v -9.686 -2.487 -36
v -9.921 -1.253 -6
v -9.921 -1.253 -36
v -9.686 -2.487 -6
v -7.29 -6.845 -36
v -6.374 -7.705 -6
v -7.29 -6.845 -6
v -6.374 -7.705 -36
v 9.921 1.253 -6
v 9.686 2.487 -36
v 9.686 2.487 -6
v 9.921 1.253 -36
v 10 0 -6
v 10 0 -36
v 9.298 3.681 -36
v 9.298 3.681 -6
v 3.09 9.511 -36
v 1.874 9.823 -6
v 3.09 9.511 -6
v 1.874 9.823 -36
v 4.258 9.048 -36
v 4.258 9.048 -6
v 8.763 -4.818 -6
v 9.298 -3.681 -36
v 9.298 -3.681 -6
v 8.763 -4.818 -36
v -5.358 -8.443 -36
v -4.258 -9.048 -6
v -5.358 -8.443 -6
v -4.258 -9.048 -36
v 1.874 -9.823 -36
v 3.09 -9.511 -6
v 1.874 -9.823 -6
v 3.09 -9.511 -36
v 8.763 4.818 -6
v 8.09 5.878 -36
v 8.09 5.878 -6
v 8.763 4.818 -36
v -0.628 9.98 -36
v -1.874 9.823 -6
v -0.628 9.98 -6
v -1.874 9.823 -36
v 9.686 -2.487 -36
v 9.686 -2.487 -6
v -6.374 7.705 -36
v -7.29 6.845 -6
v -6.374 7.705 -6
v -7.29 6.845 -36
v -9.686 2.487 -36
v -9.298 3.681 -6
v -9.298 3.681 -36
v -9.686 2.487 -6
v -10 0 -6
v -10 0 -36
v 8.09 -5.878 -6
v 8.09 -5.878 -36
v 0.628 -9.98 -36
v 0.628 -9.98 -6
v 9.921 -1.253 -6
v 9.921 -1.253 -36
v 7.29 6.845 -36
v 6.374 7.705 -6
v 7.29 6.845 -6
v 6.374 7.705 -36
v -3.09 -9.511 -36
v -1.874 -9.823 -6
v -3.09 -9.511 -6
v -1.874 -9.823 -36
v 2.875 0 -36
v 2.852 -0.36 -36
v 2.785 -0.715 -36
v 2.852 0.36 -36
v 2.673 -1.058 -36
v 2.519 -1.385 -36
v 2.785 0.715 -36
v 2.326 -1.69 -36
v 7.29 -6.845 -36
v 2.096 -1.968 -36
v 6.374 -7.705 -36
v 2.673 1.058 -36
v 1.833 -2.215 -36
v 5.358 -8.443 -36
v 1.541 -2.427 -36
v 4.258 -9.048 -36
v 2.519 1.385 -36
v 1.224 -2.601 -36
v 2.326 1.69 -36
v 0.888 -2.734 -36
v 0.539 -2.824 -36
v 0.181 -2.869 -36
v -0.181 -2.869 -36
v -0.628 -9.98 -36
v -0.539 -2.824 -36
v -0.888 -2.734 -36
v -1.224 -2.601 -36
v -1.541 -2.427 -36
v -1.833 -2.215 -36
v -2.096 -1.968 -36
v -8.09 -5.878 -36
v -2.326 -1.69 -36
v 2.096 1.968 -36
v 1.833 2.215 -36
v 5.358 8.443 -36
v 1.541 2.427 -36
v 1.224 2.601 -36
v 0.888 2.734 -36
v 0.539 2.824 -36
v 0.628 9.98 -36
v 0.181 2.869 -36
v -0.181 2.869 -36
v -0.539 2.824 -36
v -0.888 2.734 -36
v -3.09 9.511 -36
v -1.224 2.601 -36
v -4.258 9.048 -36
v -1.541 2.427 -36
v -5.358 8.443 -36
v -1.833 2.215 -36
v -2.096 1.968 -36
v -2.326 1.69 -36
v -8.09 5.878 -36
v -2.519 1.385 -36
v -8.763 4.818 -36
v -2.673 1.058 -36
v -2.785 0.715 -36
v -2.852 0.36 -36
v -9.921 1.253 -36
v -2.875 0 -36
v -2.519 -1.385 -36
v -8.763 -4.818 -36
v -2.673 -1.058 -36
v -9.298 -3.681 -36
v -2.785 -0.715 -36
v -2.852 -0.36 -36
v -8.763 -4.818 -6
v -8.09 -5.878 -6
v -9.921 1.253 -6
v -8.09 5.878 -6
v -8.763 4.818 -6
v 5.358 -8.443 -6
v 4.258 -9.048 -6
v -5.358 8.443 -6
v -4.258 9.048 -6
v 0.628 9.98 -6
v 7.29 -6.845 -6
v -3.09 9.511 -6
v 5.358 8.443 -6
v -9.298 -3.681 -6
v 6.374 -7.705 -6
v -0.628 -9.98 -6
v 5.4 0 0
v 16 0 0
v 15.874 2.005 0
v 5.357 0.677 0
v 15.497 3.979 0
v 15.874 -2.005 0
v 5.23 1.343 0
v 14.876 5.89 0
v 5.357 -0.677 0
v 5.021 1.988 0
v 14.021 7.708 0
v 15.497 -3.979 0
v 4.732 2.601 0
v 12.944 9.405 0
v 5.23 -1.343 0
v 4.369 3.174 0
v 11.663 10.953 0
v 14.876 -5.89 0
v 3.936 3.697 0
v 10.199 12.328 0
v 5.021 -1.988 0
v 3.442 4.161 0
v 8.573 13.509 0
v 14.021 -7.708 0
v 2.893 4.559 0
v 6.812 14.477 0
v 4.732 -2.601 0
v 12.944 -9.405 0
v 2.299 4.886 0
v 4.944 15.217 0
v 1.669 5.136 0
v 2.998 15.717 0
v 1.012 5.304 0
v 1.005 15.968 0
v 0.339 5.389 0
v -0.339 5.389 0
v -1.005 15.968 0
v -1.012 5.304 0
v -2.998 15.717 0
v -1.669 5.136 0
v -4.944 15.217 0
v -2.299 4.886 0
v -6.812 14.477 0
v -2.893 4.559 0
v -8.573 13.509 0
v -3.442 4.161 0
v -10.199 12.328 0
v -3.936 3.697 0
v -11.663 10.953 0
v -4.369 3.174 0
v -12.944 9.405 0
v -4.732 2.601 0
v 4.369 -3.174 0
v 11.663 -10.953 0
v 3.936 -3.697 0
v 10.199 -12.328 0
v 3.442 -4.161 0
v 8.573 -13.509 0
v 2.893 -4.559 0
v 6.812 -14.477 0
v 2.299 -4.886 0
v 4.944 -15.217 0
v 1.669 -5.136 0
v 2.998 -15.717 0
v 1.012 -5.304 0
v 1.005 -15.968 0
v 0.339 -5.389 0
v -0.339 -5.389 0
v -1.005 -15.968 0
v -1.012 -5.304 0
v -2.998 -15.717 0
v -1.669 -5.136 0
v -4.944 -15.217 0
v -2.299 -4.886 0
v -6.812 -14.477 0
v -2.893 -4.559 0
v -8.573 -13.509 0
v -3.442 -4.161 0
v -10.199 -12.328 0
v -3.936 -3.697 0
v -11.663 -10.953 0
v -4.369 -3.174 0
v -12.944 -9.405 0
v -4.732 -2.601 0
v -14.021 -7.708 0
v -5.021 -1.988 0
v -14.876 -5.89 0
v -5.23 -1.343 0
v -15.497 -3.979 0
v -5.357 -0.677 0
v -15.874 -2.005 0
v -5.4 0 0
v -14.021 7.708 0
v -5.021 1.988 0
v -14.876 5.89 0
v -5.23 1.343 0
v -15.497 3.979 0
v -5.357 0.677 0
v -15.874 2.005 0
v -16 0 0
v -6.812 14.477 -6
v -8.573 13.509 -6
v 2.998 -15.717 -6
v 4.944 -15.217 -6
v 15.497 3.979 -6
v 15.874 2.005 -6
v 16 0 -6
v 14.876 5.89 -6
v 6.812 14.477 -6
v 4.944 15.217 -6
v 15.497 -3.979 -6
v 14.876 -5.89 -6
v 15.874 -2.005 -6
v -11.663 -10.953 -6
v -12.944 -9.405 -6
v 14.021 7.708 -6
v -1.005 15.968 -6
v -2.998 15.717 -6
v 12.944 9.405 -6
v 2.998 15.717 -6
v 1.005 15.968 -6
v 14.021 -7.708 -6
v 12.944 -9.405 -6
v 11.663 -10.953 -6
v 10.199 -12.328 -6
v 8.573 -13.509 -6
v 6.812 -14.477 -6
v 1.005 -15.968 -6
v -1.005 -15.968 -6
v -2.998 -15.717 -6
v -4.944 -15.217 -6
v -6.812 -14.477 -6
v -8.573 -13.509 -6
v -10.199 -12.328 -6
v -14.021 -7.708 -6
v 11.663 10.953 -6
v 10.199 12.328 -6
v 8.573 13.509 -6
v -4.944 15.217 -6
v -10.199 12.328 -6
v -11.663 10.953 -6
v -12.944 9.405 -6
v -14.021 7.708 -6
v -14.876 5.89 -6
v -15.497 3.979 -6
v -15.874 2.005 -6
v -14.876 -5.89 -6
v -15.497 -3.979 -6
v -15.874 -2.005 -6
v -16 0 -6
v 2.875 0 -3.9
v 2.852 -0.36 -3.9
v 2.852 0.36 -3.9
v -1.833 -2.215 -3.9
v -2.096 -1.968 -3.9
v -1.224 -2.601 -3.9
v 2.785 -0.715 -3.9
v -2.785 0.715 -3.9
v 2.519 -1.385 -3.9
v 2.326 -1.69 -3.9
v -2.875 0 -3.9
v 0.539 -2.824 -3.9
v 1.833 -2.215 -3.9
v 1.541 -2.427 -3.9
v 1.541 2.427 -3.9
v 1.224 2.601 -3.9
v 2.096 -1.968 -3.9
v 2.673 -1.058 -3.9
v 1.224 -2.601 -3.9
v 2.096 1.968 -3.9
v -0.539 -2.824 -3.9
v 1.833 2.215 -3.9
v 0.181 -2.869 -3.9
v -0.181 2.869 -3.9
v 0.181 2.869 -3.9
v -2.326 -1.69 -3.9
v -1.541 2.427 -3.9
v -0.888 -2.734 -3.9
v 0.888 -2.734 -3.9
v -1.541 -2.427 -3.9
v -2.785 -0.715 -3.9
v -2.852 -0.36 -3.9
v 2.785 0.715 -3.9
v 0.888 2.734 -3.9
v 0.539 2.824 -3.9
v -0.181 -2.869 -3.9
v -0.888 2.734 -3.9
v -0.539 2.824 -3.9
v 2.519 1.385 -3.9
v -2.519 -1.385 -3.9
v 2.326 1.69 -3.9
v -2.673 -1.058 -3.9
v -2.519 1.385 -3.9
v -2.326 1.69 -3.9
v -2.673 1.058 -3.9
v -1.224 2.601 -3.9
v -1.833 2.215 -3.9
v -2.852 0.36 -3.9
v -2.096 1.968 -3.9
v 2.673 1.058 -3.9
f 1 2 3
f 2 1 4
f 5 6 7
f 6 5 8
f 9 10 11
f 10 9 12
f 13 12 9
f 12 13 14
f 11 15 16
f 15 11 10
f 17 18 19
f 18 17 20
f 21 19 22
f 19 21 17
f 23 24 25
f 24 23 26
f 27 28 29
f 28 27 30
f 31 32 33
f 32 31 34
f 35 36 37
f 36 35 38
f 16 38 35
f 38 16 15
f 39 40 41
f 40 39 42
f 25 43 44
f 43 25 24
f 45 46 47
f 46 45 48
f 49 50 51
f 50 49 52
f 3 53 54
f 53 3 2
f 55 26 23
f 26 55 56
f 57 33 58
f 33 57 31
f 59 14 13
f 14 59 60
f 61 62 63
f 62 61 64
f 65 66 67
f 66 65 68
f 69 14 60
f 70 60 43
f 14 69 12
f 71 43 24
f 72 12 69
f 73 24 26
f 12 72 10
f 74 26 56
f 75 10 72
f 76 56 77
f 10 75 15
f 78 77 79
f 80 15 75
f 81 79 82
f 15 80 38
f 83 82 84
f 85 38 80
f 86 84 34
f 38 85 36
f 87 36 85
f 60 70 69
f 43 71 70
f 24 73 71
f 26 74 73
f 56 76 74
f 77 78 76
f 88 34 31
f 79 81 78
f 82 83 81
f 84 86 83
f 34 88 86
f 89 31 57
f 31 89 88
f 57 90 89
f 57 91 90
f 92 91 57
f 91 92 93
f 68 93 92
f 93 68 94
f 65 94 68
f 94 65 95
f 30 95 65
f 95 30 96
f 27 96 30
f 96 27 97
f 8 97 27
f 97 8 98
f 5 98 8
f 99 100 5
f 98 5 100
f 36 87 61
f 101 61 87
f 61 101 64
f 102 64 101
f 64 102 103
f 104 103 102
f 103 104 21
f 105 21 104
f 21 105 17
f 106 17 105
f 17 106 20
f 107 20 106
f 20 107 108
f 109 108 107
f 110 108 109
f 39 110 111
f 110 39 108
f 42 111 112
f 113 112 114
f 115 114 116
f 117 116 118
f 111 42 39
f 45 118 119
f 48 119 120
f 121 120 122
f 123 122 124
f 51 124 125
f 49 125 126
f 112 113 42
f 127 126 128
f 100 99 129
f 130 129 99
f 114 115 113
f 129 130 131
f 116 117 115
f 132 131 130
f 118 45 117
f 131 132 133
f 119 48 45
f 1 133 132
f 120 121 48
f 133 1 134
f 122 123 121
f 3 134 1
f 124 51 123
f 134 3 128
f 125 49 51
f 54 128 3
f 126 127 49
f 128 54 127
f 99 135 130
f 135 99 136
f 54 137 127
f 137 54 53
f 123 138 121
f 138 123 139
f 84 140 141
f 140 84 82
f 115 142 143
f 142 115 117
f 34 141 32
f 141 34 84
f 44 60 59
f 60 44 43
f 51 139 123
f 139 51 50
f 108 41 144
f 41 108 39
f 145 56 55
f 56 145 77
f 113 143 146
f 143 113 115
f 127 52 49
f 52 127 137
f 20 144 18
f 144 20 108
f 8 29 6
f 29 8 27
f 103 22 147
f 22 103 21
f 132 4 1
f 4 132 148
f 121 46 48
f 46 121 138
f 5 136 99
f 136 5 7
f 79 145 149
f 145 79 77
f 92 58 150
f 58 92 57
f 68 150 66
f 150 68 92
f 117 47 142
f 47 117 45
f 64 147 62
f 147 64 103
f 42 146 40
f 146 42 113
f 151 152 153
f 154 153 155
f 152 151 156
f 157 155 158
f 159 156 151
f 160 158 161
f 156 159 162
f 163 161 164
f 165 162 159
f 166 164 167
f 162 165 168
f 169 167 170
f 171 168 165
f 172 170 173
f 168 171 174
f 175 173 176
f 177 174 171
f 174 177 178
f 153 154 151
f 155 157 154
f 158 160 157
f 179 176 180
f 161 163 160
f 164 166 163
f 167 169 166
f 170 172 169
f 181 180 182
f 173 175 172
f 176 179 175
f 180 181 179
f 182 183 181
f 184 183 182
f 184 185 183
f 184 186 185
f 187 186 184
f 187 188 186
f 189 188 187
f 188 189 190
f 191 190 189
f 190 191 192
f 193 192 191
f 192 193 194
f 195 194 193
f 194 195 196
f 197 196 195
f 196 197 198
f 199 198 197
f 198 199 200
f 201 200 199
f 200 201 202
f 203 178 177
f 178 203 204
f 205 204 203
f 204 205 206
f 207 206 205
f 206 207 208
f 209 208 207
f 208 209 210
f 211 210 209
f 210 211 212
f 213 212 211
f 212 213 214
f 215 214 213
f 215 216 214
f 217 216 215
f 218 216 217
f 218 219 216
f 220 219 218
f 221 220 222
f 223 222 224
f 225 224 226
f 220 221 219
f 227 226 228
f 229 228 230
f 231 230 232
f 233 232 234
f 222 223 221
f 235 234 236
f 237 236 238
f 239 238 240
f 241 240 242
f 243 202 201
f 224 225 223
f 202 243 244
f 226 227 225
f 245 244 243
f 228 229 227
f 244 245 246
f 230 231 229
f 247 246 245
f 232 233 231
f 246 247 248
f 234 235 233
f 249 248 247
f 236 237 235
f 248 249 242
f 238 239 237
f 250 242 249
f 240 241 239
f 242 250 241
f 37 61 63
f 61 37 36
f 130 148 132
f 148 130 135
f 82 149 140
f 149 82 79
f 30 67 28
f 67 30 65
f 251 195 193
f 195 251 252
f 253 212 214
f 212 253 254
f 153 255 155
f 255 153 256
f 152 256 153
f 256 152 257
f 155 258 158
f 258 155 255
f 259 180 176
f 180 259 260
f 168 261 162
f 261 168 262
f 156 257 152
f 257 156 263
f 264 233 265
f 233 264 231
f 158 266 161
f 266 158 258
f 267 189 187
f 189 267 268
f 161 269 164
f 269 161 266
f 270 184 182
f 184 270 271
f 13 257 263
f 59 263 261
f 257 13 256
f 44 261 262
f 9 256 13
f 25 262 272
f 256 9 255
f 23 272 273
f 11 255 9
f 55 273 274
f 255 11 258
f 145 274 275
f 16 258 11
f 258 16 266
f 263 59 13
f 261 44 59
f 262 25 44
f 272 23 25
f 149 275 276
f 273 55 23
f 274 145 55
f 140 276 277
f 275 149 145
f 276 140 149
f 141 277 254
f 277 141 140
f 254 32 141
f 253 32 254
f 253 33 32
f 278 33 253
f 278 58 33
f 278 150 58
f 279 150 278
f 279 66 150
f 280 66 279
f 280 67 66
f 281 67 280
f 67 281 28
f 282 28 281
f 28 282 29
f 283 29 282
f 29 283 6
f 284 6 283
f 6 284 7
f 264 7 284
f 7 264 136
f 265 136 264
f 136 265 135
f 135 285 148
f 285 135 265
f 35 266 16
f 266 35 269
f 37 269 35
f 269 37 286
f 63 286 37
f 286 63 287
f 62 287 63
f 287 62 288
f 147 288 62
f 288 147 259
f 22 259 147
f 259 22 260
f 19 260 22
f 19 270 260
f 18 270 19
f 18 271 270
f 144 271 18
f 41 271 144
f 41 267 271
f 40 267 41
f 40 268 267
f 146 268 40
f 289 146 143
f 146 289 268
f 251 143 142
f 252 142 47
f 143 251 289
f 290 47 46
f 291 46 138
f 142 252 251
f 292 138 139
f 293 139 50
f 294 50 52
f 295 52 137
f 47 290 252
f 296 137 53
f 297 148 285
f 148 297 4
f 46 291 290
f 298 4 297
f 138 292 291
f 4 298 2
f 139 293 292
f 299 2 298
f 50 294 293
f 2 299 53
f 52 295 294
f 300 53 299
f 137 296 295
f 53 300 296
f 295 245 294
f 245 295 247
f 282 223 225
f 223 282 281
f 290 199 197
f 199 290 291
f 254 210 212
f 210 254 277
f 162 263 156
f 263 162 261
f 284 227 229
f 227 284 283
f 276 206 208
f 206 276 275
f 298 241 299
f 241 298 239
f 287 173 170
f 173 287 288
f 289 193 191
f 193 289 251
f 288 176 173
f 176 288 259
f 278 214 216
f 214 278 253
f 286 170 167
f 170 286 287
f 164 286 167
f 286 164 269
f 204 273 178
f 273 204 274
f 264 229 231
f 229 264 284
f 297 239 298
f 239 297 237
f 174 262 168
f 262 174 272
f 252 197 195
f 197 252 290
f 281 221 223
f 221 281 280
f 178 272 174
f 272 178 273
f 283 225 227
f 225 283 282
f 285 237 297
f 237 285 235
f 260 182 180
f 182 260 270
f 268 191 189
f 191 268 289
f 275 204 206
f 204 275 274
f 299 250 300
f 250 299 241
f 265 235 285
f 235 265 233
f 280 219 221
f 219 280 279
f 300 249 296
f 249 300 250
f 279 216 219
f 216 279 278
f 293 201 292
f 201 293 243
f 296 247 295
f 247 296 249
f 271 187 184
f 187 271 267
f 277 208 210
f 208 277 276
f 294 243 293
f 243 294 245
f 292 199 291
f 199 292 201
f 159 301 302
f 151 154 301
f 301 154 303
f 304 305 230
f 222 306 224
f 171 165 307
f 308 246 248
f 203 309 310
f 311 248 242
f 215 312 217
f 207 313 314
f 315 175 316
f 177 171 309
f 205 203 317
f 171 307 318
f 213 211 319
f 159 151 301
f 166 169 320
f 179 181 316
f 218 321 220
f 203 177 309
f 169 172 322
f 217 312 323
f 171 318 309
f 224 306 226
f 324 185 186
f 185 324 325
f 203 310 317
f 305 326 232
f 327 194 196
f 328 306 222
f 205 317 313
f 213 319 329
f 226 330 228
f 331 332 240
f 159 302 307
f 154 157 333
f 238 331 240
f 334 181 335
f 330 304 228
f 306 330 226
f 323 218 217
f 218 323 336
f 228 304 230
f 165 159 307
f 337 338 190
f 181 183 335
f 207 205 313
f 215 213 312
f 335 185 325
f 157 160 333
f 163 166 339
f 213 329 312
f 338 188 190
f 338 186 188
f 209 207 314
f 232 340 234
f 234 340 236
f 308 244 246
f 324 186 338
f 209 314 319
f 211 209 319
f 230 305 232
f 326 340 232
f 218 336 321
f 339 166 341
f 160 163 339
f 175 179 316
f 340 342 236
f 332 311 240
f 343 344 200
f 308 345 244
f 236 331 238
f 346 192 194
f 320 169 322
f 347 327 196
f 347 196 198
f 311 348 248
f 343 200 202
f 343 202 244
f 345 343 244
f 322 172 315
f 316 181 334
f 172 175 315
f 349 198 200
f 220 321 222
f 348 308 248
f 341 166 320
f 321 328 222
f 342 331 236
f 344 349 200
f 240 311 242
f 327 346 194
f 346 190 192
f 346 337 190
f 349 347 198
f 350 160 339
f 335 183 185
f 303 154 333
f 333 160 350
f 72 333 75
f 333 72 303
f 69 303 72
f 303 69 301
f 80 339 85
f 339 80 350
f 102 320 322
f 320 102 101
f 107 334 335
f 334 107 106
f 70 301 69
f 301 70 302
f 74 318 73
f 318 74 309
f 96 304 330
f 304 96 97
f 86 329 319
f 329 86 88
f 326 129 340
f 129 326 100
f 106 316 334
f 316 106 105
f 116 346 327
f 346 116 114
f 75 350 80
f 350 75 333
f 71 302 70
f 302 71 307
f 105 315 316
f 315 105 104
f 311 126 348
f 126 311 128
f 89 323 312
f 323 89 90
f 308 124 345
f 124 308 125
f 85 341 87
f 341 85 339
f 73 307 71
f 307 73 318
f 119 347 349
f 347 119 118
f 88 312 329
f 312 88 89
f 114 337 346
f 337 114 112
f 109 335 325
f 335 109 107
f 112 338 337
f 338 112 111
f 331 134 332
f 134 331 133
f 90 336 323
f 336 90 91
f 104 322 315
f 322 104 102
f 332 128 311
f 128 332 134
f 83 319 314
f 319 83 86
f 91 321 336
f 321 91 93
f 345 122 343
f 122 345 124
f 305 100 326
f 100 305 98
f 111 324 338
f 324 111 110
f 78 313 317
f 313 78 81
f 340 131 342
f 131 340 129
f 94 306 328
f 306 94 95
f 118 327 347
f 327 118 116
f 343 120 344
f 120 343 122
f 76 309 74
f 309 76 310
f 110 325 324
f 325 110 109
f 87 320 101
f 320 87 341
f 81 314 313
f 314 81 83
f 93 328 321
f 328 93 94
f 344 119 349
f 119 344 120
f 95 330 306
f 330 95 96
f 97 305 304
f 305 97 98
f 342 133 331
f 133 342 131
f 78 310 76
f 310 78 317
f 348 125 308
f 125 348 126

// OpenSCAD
$fn = 50;


difference() {
	union() {
		translate(v = [0, 0, -36.0000000000]) {
			cylinder(h = 36, r = 10.0000000000);
		}
		translate(v = [0, 0, -6.0000000000]) {
			cylinder(h = 6, r = 16.0000000000);
		}
	}
	union() {
		translate(v = [0, 0, 0]) {
			rotate(a = [0, 0, 0]) {
				difference() {
					union() {
						#translate(v = [0, 0, -36.0000000000]) {
							cylinder(h = 36, r = 2.6000000000);
						}
						#translate(v = [0, 0, -3.9000000000]) {
							cylinder(h = 3.9000000000, r1 = 2.8750000000, r2 = 5.4000000000);
						}
						#translate(v = [0, 0, -36.0000000000]) {
							cylinder(h = 36, r = 2.8750000000);
						}
						#translate(v = [0, 0, -36.0000000000]) {
							cylinder(h = 36, r = 2.6000000000);
						}
					}
					union();
				}
			}
		}
	}
}
